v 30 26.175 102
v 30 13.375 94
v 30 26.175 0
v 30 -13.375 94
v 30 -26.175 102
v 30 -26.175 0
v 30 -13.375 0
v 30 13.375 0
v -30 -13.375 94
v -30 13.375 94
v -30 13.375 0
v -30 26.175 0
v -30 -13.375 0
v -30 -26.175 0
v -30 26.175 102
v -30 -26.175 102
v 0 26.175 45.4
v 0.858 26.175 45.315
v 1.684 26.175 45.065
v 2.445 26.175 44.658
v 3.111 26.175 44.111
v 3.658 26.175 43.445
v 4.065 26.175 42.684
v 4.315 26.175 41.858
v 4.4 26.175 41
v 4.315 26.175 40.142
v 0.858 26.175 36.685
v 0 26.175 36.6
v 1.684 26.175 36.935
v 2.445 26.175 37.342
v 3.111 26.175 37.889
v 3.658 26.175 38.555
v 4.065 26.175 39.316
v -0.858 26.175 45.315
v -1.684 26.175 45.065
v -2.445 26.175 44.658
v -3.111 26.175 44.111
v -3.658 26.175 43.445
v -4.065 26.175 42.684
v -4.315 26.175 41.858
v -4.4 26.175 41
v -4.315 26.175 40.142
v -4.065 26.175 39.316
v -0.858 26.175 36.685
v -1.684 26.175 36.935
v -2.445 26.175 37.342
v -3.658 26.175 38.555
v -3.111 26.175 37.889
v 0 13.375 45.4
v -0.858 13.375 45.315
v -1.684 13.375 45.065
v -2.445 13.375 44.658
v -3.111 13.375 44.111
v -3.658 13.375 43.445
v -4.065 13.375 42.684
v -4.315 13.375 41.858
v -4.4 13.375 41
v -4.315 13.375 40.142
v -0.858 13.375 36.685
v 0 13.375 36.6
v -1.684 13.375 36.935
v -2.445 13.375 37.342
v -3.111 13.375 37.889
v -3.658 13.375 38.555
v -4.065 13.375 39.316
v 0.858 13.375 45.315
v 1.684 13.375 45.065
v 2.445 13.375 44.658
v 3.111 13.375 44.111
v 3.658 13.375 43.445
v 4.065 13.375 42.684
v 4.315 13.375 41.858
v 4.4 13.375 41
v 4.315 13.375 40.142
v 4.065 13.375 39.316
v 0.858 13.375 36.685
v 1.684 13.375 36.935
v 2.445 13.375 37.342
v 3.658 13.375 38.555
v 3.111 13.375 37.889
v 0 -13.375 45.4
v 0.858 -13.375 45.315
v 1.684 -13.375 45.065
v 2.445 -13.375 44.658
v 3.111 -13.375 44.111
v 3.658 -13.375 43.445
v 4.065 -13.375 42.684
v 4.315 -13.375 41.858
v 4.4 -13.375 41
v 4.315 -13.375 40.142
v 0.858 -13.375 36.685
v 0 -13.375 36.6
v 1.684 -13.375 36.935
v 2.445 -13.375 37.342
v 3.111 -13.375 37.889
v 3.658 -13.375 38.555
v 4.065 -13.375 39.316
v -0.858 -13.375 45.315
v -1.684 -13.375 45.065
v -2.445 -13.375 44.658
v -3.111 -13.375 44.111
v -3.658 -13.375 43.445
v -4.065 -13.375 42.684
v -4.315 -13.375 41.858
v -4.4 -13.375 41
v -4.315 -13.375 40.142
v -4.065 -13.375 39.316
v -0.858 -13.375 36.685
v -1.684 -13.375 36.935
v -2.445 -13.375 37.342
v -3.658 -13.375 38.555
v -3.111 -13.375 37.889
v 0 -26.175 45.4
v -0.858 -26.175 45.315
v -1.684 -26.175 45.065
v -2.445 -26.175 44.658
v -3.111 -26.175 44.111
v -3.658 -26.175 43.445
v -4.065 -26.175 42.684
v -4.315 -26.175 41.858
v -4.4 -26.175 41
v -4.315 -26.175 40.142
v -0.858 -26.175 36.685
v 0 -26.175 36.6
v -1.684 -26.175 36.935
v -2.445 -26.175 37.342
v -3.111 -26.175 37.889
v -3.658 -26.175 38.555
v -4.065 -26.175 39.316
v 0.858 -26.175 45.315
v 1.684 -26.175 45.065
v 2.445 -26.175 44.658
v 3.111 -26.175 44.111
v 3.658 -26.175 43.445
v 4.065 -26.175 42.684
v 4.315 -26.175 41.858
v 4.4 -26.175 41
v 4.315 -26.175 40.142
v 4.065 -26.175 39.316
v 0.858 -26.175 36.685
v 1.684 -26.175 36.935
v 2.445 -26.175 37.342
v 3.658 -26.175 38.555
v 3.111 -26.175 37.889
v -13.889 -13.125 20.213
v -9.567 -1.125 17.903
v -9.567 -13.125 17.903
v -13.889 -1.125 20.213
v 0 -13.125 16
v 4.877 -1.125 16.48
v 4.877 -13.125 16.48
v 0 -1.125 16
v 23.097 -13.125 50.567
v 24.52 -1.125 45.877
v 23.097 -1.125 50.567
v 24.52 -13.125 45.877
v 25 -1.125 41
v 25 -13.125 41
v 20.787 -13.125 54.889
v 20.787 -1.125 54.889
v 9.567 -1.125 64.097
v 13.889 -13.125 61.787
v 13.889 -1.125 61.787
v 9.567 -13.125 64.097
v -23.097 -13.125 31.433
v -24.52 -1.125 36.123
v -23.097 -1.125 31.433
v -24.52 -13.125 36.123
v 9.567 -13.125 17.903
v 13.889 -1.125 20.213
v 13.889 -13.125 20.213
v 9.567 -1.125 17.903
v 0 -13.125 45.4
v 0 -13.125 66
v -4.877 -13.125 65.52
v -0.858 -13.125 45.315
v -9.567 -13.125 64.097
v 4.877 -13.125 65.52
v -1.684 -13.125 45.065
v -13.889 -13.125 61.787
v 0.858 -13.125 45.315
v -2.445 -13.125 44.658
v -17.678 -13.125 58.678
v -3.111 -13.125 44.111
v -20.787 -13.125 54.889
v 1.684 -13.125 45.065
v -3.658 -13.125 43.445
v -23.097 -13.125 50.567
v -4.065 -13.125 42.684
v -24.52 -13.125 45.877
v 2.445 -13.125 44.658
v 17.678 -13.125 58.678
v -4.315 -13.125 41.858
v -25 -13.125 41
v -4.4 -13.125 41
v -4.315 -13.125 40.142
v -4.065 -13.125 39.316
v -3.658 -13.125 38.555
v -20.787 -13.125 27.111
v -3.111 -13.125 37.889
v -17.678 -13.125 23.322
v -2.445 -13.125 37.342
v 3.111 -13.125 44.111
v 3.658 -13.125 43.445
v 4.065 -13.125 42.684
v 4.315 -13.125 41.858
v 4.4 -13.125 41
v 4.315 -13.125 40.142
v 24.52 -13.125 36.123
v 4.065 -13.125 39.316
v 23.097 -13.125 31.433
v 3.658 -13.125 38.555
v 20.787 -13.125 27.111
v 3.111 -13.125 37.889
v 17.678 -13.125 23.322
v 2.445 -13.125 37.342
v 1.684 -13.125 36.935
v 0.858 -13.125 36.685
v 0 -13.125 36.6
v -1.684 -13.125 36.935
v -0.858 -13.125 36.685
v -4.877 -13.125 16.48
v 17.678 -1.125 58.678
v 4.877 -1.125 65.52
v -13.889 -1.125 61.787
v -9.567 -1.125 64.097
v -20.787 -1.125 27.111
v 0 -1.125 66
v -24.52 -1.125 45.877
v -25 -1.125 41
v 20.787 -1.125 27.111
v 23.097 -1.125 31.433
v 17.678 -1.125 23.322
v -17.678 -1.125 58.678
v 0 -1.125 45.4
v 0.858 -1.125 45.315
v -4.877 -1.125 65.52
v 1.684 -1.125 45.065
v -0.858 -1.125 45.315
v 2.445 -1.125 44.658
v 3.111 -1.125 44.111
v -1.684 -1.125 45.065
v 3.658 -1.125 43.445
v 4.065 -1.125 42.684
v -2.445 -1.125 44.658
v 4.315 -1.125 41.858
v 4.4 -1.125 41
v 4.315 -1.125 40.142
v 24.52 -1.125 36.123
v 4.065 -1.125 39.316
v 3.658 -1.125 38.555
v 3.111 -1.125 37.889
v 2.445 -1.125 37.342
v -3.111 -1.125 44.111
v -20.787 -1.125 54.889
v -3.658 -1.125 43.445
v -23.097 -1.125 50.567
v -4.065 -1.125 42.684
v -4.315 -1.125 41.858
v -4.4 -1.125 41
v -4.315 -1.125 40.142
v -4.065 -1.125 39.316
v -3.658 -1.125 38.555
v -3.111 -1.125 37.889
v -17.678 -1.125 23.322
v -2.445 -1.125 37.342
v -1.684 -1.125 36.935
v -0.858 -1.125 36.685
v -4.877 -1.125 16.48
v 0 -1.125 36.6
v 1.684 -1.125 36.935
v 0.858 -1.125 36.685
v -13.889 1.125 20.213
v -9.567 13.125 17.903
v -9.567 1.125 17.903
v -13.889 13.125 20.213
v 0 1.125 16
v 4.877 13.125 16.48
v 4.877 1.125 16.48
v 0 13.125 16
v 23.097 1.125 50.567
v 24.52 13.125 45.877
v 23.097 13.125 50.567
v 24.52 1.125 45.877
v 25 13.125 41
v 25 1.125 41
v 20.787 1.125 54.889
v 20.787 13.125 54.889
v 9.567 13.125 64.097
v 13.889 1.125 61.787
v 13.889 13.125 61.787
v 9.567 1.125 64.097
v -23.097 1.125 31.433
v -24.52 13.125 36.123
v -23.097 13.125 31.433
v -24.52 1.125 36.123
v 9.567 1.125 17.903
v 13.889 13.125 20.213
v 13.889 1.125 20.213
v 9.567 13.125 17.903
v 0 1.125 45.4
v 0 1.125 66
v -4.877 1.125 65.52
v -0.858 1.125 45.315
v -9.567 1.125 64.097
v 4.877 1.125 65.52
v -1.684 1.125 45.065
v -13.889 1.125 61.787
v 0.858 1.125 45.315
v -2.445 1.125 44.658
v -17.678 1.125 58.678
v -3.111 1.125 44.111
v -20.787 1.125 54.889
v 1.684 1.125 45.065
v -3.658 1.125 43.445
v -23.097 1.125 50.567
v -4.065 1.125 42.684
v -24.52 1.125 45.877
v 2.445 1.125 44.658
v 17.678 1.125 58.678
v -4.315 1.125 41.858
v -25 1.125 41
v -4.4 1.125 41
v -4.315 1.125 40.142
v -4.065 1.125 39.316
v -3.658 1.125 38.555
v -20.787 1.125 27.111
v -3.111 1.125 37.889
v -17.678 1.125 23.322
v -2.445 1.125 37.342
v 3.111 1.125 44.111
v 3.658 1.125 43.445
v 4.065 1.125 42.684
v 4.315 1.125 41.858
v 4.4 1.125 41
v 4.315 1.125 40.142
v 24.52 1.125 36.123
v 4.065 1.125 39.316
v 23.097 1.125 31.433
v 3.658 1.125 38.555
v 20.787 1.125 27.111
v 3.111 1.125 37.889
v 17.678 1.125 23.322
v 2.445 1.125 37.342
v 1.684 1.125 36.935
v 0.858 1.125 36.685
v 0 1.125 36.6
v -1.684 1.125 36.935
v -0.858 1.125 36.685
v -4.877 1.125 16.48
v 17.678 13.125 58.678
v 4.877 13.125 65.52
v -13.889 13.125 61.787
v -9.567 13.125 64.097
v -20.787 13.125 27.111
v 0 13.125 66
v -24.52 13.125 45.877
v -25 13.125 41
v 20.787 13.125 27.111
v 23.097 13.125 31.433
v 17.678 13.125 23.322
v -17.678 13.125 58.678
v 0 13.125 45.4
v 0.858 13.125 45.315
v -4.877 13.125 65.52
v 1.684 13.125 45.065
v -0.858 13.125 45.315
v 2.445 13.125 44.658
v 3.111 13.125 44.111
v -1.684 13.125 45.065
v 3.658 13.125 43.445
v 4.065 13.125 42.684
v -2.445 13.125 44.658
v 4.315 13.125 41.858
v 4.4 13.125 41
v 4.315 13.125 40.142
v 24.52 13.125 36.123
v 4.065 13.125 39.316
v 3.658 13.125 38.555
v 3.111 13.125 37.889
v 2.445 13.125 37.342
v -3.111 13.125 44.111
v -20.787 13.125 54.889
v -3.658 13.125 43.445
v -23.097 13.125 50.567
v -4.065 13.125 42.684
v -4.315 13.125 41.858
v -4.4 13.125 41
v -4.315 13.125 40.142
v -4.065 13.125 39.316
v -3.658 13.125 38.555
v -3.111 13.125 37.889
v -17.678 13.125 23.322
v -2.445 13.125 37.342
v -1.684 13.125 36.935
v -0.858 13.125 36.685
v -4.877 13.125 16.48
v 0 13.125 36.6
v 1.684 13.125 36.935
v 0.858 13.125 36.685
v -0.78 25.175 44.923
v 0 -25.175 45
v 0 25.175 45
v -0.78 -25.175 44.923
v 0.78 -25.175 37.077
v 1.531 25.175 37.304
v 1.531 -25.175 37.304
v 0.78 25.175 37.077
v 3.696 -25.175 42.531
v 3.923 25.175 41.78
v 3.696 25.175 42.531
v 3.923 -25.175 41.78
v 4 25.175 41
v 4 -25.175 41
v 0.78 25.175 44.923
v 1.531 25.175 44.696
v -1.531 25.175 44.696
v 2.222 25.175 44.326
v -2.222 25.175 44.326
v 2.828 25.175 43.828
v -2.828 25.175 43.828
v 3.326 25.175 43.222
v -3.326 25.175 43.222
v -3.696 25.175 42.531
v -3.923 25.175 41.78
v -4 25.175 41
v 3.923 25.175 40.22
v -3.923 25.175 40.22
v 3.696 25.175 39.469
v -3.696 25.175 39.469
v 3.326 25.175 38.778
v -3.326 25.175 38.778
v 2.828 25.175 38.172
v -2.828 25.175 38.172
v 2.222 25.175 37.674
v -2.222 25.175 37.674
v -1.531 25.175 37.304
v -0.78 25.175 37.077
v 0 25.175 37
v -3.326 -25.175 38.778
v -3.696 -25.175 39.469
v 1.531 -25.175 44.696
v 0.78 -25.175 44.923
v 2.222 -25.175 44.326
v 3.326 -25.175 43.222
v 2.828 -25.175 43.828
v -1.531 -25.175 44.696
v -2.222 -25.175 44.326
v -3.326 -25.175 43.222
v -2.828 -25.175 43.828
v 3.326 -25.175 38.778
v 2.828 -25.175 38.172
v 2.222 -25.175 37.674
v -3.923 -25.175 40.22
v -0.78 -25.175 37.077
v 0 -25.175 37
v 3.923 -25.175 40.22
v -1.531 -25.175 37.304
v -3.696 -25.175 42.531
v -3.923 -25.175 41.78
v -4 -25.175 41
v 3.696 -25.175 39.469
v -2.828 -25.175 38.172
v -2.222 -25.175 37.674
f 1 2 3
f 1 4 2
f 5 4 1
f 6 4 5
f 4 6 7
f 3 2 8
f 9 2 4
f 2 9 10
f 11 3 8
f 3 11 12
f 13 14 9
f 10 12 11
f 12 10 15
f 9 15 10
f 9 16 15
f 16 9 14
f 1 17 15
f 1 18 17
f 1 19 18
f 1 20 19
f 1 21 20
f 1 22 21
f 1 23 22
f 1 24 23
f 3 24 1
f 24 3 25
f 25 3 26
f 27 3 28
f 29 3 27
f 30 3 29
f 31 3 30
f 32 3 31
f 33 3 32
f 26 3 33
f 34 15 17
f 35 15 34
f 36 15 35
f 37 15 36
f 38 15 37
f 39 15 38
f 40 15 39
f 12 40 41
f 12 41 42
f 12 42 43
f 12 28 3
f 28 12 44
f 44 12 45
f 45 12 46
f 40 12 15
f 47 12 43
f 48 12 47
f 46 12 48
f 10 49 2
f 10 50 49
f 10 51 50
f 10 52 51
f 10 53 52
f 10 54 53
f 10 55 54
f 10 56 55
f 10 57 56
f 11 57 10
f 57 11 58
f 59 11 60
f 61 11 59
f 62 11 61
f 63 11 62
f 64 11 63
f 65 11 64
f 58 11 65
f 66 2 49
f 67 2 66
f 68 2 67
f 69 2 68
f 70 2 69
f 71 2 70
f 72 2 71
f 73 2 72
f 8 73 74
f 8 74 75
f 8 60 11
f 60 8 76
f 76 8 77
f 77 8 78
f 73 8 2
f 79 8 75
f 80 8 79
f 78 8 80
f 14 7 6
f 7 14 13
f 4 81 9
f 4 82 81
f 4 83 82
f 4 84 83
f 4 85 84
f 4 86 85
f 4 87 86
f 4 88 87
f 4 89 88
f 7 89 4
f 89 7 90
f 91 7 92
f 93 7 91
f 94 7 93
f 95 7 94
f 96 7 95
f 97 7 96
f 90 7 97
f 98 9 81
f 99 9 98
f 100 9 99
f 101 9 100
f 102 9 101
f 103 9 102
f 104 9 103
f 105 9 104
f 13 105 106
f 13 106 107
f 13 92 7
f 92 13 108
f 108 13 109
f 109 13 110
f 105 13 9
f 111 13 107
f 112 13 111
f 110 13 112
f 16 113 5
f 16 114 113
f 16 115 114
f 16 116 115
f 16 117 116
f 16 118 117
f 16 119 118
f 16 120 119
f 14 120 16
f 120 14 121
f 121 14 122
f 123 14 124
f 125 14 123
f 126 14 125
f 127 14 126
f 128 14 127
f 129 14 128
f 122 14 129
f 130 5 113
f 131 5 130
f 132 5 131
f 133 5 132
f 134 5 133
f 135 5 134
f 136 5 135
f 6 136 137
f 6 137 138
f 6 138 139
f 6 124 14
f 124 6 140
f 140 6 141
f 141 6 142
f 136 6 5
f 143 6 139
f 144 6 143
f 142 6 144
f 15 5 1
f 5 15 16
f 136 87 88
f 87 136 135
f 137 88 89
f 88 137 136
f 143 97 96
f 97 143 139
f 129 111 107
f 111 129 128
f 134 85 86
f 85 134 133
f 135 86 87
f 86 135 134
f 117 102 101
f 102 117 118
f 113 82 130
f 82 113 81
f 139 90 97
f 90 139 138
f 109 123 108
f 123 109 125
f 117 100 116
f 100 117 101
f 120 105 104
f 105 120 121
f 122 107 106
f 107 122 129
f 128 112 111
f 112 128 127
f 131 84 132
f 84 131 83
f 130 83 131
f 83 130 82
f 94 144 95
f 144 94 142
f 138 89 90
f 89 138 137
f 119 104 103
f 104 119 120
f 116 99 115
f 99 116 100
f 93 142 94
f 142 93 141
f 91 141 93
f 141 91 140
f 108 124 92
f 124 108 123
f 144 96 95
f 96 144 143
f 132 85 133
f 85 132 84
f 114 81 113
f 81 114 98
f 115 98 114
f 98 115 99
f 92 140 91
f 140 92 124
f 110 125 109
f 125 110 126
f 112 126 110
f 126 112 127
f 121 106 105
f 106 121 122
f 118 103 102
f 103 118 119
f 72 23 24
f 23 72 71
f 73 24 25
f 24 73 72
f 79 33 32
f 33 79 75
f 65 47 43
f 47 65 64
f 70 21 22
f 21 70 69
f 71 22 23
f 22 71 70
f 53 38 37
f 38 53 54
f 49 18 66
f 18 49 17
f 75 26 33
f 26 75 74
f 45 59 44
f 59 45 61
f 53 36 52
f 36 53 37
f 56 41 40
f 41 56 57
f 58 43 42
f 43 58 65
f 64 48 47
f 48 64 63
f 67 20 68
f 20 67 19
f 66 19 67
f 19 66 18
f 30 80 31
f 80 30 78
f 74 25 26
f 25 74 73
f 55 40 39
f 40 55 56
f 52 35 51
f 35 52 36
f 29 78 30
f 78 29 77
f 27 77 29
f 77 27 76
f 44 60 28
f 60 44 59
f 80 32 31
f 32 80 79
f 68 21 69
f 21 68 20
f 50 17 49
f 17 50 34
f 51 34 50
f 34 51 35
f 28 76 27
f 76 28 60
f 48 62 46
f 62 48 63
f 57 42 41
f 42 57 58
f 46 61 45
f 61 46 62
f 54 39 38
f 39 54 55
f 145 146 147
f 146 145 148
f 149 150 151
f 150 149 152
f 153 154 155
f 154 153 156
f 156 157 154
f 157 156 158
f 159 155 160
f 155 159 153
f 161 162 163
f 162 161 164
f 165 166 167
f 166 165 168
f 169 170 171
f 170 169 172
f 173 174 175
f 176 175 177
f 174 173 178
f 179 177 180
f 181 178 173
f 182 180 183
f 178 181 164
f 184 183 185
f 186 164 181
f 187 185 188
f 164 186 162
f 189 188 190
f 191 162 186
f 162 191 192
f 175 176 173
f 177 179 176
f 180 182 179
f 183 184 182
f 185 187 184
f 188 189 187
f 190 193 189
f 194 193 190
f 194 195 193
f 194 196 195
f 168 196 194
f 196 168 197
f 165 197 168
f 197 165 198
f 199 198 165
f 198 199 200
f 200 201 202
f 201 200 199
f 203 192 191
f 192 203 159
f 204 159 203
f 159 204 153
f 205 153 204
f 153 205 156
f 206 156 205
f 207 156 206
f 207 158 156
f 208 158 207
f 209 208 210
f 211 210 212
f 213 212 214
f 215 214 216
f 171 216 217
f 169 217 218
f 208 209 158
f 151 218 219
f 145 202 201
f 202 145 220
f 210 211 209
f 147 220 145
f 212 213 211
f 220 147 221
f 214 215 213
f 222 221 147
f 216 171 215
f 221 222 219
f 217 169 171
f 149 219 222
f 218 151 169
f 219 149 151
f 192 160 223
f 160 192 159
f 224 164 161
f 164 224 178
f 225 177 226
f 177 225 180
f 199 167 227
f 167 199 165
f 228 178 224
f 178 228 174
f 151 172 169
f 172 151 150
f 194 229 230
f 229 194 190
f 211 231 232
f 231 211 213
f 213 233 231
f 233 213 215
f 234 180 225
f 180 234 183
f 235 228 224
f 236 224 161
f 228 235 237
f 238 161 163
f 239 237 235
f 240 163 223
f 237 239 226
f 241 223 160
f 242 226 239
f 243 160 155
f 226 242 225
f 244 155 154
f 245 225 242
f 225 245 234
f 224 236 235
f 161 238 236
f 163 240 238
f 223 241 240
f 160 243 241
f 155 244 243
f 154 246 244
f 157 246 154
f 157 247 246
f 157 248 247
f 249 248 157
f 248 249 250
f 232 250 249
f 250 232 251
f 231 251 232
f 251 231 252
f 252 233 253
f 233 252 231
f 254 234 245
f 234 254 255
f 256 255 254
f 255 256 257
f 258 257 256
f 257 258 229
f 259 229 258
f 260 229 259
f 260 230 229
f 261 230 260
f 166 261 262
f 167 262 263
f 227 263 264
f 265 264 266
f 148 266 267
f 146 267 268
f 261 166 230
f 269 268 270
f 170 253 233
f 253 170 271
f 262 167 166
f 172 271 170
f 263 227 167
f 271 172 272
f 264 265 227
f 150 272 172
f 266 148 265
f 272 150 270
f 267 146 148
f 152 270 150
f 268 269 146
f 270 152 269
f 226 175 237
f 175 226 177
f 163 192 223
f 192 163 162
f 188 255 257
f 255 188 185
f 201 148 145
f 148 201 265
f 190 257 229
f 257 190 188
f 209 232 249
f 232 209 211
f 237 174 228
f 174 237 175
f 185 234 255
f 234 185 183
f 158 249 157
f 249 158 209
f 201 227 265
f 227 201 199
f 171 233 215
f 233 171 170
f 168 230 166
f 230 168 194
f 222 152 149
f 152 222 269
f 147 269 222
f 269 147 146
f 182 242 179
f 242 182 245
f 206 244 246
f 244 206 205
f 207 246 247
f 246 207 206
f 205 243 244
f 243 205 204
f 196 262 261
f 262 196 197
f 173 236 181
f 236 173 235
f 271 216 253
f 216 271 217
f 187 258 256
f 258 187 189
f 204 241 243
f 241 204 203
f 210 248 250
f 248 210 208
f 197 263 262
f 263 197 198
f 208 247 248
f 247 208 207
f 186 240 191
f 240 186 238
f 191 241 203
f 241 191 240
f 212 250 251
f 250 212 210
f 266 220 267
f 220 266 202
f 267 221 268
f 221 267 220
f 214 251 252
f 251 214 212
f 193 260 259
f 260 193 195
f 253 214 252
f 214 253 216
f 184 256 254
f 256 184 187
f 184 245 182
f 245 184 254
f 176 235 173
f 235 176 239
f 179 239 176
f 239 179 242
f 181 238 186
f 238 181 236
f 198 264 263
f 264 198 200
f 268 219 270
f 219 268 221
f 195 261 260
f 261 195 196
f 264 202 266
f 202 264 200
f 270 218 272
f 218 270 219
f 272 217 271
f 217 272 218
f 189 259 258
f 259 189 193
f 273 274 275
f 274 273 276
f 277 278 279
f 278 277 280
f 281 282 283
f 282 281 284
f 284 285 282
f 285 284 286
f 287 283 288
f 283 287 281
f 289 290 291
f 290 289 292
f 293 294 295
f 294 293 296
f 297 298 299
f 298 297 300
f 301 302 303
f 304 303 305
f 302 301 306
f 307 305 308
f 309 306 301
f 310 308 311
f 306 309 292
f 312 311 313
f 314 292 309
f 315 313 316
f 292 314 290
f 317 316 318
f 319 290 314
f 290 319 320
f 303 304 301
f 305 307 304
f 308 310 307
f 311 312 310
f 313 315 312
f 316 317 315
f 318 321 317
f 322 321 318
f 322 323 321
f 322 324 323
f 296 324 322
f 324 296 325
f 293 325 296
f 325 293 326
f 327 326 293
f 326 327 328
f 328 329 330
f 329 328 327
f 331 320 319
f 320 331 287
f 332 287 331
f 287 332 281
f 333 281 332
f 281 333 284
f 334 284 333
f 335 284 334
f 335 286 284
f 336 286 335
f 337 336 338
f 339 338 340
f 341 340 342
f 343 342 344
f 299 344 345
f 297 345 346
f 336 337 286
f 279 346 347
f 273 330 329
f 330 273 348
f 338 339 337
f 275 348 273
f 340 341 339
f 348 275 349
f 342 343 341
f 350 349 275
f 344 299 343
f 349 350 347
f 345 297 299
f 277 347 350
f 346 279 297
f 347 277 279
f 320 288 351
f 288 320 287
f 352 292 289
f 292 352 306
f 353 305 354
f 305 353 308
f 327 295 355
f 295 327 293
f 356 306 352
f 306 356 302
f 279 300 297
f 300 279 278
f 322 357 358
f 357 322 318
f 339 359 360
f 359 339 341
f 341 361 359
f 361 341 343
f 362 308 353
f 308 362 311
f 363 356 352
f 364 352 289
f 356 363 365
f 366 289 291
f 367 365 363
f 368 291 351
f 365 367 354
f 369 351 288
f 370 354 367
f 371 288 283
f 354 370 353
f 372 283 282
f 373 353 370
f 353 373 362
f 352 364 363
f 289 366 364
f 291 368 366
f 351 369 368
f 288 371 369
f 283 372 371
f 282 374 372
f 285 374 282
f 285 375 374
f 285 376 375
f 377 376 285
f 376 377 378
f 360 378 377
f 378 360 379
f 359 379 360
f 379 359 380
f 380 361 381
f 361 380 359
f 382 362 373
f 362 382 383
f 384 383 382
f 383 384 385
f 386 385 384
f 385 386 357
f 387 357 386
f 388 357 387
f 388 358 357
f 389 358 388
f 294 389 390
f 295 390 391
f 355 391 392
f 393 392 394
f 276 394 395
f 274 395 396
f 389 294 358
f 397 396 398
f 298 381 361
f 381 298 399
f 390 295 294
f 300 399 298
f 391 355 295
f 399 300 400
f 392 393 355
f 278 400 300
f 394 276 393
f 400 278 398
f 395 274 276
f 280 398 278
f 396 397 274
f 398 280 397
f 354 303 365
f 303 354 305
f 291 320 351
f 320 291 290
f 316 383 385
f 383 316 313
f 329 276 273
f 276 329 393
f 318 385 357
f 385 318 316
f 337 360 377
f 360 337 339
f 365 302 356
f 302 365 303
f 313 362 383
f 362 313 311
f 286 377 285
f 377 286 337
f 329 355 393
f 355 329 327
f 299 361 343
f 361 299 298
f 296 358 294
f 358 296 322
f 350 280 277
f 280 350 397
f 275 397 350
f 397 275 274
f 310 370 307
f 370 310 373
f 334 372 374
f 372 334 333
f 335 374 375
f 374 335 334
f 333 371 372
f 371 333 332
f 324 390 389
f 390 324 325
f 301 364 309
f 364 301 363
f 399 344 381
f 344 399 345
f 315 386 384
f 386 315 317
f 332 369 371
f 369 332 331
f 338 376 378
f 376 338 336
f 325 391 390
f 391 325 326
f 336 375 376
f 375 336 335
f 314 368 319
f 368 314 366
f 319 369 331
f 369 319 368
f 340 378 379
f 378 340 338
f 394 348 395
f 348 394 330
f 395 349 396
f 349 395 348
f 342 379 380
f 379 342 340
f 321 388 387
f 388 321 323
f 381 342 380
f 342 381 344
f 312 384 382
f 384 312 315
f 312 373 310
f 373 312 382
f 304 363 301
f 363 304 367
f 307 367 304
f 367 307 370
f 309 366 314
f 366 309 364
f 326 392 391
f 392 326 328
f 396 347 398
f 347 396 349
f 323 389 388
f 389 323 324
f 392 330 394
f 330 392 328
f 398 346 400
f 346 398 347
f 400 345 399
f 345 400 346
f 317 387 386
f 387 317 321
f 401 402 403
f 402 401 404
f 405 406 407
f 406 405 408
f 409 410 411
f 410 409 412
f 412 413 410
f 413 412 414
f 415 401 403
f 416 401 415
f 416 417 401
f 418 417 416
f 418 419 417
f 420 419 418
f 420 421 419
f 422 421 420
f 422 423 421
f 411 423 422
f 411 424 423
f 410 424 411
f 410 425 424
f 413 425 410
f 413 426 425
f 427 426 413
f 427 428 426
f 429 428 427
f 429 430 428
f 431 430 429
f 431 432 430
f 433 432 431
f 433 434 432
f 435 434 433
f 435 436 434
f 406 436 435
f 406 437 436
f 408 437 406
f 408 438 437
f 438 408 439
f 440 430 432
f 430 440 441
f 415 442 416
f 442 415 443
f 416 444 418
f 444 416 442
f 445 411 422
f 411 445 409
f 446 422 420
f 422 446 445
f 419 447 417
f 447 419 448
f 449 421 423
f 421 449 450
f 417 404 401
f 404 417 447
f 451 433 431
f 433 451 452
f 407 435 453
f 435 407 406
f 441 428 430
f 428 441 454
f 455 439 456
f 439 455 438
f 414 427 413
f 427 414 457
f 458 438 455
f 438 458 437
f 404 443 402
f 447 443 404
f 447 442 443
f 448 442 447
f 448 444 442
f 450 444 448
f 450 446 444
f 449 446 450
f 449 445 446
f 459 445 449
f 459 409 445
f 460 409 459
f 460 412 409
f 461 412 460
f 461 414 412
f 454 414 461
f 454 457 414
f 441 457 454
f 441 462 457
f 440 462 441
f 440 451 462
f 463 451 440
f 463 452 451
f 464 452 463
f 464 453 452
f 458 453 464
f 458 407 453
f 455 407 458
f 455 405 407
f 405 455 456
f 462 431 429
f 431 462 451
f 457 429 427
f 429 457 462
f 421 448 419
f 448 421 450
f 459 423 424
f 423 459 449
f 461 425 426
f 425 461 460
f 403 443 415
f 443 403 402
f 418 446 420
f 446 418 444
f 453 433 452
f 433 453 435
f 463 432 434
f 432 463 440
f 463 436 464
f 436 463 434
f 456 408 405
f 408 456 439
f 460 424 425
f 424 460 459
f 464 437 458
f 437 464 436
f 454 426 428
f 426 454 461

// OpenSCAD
$fn = 32;

// ------------------------------------------------------------------------
// Trolley wheel set: wheels d50, fork 94 mm tall
// Every part is its own module, assembly() places every instance.
// ------------------------------------------------------------------------

// --- part 1 ---
module trolley_fork() {
  difference() {
    union() {
      translate([-30, 13.375, 0]) cube([60, 12.8, 94]);
      translate([-30, -26.175, 0]) cube([60, 12.8, 94]);
      translate([-30, -26.175, 94]) cube([60, 52.35, 8]);
    }
    translate([0, -19.775, 41]) rotate([90, 0, 0]) cylinder(h = 14.8, d = 8.8, center = true);
    translate([0, 19.775, 41]) rotate([90, 0, 0]) cylinder(h = 14.8, d = 8.8, center = true);
  }
}

// --- part 2 ---
module trolley_wheel() {
  difference() {
      translate([0, 0, 0]) cylinder(h = 12, d = 50);
      translate([0, 0, -1]) cylinder(h = 14, d = 8.8);
    }
}

// --- part 3 ---
module trolley_axle() {
  translate([0, 0, -25.175]) cylinder(h = 50.35, d = 8);
}

// --- assembly ---
module assembly() {
  color([0.80, 0.24, 0.20]) translate([0, 0, 0]) rotate([0, 0, 0]) trolley_fork();
  color([0.20, 0.45, 0.75]) translate([0, -1.125, 41]) rotate([90, 0, 0]) trolley_wheel();
  color([0.25, 0.62, 0.32]) translate([0, 13.125, 41]) rotate([90, 0, 0]) trolley_wheel();
  color([0.92, 0.70, 0.18]) translate([0, 0, 41]) rotate([90, 0, 0]) trolley_axle();
}

assembly();
